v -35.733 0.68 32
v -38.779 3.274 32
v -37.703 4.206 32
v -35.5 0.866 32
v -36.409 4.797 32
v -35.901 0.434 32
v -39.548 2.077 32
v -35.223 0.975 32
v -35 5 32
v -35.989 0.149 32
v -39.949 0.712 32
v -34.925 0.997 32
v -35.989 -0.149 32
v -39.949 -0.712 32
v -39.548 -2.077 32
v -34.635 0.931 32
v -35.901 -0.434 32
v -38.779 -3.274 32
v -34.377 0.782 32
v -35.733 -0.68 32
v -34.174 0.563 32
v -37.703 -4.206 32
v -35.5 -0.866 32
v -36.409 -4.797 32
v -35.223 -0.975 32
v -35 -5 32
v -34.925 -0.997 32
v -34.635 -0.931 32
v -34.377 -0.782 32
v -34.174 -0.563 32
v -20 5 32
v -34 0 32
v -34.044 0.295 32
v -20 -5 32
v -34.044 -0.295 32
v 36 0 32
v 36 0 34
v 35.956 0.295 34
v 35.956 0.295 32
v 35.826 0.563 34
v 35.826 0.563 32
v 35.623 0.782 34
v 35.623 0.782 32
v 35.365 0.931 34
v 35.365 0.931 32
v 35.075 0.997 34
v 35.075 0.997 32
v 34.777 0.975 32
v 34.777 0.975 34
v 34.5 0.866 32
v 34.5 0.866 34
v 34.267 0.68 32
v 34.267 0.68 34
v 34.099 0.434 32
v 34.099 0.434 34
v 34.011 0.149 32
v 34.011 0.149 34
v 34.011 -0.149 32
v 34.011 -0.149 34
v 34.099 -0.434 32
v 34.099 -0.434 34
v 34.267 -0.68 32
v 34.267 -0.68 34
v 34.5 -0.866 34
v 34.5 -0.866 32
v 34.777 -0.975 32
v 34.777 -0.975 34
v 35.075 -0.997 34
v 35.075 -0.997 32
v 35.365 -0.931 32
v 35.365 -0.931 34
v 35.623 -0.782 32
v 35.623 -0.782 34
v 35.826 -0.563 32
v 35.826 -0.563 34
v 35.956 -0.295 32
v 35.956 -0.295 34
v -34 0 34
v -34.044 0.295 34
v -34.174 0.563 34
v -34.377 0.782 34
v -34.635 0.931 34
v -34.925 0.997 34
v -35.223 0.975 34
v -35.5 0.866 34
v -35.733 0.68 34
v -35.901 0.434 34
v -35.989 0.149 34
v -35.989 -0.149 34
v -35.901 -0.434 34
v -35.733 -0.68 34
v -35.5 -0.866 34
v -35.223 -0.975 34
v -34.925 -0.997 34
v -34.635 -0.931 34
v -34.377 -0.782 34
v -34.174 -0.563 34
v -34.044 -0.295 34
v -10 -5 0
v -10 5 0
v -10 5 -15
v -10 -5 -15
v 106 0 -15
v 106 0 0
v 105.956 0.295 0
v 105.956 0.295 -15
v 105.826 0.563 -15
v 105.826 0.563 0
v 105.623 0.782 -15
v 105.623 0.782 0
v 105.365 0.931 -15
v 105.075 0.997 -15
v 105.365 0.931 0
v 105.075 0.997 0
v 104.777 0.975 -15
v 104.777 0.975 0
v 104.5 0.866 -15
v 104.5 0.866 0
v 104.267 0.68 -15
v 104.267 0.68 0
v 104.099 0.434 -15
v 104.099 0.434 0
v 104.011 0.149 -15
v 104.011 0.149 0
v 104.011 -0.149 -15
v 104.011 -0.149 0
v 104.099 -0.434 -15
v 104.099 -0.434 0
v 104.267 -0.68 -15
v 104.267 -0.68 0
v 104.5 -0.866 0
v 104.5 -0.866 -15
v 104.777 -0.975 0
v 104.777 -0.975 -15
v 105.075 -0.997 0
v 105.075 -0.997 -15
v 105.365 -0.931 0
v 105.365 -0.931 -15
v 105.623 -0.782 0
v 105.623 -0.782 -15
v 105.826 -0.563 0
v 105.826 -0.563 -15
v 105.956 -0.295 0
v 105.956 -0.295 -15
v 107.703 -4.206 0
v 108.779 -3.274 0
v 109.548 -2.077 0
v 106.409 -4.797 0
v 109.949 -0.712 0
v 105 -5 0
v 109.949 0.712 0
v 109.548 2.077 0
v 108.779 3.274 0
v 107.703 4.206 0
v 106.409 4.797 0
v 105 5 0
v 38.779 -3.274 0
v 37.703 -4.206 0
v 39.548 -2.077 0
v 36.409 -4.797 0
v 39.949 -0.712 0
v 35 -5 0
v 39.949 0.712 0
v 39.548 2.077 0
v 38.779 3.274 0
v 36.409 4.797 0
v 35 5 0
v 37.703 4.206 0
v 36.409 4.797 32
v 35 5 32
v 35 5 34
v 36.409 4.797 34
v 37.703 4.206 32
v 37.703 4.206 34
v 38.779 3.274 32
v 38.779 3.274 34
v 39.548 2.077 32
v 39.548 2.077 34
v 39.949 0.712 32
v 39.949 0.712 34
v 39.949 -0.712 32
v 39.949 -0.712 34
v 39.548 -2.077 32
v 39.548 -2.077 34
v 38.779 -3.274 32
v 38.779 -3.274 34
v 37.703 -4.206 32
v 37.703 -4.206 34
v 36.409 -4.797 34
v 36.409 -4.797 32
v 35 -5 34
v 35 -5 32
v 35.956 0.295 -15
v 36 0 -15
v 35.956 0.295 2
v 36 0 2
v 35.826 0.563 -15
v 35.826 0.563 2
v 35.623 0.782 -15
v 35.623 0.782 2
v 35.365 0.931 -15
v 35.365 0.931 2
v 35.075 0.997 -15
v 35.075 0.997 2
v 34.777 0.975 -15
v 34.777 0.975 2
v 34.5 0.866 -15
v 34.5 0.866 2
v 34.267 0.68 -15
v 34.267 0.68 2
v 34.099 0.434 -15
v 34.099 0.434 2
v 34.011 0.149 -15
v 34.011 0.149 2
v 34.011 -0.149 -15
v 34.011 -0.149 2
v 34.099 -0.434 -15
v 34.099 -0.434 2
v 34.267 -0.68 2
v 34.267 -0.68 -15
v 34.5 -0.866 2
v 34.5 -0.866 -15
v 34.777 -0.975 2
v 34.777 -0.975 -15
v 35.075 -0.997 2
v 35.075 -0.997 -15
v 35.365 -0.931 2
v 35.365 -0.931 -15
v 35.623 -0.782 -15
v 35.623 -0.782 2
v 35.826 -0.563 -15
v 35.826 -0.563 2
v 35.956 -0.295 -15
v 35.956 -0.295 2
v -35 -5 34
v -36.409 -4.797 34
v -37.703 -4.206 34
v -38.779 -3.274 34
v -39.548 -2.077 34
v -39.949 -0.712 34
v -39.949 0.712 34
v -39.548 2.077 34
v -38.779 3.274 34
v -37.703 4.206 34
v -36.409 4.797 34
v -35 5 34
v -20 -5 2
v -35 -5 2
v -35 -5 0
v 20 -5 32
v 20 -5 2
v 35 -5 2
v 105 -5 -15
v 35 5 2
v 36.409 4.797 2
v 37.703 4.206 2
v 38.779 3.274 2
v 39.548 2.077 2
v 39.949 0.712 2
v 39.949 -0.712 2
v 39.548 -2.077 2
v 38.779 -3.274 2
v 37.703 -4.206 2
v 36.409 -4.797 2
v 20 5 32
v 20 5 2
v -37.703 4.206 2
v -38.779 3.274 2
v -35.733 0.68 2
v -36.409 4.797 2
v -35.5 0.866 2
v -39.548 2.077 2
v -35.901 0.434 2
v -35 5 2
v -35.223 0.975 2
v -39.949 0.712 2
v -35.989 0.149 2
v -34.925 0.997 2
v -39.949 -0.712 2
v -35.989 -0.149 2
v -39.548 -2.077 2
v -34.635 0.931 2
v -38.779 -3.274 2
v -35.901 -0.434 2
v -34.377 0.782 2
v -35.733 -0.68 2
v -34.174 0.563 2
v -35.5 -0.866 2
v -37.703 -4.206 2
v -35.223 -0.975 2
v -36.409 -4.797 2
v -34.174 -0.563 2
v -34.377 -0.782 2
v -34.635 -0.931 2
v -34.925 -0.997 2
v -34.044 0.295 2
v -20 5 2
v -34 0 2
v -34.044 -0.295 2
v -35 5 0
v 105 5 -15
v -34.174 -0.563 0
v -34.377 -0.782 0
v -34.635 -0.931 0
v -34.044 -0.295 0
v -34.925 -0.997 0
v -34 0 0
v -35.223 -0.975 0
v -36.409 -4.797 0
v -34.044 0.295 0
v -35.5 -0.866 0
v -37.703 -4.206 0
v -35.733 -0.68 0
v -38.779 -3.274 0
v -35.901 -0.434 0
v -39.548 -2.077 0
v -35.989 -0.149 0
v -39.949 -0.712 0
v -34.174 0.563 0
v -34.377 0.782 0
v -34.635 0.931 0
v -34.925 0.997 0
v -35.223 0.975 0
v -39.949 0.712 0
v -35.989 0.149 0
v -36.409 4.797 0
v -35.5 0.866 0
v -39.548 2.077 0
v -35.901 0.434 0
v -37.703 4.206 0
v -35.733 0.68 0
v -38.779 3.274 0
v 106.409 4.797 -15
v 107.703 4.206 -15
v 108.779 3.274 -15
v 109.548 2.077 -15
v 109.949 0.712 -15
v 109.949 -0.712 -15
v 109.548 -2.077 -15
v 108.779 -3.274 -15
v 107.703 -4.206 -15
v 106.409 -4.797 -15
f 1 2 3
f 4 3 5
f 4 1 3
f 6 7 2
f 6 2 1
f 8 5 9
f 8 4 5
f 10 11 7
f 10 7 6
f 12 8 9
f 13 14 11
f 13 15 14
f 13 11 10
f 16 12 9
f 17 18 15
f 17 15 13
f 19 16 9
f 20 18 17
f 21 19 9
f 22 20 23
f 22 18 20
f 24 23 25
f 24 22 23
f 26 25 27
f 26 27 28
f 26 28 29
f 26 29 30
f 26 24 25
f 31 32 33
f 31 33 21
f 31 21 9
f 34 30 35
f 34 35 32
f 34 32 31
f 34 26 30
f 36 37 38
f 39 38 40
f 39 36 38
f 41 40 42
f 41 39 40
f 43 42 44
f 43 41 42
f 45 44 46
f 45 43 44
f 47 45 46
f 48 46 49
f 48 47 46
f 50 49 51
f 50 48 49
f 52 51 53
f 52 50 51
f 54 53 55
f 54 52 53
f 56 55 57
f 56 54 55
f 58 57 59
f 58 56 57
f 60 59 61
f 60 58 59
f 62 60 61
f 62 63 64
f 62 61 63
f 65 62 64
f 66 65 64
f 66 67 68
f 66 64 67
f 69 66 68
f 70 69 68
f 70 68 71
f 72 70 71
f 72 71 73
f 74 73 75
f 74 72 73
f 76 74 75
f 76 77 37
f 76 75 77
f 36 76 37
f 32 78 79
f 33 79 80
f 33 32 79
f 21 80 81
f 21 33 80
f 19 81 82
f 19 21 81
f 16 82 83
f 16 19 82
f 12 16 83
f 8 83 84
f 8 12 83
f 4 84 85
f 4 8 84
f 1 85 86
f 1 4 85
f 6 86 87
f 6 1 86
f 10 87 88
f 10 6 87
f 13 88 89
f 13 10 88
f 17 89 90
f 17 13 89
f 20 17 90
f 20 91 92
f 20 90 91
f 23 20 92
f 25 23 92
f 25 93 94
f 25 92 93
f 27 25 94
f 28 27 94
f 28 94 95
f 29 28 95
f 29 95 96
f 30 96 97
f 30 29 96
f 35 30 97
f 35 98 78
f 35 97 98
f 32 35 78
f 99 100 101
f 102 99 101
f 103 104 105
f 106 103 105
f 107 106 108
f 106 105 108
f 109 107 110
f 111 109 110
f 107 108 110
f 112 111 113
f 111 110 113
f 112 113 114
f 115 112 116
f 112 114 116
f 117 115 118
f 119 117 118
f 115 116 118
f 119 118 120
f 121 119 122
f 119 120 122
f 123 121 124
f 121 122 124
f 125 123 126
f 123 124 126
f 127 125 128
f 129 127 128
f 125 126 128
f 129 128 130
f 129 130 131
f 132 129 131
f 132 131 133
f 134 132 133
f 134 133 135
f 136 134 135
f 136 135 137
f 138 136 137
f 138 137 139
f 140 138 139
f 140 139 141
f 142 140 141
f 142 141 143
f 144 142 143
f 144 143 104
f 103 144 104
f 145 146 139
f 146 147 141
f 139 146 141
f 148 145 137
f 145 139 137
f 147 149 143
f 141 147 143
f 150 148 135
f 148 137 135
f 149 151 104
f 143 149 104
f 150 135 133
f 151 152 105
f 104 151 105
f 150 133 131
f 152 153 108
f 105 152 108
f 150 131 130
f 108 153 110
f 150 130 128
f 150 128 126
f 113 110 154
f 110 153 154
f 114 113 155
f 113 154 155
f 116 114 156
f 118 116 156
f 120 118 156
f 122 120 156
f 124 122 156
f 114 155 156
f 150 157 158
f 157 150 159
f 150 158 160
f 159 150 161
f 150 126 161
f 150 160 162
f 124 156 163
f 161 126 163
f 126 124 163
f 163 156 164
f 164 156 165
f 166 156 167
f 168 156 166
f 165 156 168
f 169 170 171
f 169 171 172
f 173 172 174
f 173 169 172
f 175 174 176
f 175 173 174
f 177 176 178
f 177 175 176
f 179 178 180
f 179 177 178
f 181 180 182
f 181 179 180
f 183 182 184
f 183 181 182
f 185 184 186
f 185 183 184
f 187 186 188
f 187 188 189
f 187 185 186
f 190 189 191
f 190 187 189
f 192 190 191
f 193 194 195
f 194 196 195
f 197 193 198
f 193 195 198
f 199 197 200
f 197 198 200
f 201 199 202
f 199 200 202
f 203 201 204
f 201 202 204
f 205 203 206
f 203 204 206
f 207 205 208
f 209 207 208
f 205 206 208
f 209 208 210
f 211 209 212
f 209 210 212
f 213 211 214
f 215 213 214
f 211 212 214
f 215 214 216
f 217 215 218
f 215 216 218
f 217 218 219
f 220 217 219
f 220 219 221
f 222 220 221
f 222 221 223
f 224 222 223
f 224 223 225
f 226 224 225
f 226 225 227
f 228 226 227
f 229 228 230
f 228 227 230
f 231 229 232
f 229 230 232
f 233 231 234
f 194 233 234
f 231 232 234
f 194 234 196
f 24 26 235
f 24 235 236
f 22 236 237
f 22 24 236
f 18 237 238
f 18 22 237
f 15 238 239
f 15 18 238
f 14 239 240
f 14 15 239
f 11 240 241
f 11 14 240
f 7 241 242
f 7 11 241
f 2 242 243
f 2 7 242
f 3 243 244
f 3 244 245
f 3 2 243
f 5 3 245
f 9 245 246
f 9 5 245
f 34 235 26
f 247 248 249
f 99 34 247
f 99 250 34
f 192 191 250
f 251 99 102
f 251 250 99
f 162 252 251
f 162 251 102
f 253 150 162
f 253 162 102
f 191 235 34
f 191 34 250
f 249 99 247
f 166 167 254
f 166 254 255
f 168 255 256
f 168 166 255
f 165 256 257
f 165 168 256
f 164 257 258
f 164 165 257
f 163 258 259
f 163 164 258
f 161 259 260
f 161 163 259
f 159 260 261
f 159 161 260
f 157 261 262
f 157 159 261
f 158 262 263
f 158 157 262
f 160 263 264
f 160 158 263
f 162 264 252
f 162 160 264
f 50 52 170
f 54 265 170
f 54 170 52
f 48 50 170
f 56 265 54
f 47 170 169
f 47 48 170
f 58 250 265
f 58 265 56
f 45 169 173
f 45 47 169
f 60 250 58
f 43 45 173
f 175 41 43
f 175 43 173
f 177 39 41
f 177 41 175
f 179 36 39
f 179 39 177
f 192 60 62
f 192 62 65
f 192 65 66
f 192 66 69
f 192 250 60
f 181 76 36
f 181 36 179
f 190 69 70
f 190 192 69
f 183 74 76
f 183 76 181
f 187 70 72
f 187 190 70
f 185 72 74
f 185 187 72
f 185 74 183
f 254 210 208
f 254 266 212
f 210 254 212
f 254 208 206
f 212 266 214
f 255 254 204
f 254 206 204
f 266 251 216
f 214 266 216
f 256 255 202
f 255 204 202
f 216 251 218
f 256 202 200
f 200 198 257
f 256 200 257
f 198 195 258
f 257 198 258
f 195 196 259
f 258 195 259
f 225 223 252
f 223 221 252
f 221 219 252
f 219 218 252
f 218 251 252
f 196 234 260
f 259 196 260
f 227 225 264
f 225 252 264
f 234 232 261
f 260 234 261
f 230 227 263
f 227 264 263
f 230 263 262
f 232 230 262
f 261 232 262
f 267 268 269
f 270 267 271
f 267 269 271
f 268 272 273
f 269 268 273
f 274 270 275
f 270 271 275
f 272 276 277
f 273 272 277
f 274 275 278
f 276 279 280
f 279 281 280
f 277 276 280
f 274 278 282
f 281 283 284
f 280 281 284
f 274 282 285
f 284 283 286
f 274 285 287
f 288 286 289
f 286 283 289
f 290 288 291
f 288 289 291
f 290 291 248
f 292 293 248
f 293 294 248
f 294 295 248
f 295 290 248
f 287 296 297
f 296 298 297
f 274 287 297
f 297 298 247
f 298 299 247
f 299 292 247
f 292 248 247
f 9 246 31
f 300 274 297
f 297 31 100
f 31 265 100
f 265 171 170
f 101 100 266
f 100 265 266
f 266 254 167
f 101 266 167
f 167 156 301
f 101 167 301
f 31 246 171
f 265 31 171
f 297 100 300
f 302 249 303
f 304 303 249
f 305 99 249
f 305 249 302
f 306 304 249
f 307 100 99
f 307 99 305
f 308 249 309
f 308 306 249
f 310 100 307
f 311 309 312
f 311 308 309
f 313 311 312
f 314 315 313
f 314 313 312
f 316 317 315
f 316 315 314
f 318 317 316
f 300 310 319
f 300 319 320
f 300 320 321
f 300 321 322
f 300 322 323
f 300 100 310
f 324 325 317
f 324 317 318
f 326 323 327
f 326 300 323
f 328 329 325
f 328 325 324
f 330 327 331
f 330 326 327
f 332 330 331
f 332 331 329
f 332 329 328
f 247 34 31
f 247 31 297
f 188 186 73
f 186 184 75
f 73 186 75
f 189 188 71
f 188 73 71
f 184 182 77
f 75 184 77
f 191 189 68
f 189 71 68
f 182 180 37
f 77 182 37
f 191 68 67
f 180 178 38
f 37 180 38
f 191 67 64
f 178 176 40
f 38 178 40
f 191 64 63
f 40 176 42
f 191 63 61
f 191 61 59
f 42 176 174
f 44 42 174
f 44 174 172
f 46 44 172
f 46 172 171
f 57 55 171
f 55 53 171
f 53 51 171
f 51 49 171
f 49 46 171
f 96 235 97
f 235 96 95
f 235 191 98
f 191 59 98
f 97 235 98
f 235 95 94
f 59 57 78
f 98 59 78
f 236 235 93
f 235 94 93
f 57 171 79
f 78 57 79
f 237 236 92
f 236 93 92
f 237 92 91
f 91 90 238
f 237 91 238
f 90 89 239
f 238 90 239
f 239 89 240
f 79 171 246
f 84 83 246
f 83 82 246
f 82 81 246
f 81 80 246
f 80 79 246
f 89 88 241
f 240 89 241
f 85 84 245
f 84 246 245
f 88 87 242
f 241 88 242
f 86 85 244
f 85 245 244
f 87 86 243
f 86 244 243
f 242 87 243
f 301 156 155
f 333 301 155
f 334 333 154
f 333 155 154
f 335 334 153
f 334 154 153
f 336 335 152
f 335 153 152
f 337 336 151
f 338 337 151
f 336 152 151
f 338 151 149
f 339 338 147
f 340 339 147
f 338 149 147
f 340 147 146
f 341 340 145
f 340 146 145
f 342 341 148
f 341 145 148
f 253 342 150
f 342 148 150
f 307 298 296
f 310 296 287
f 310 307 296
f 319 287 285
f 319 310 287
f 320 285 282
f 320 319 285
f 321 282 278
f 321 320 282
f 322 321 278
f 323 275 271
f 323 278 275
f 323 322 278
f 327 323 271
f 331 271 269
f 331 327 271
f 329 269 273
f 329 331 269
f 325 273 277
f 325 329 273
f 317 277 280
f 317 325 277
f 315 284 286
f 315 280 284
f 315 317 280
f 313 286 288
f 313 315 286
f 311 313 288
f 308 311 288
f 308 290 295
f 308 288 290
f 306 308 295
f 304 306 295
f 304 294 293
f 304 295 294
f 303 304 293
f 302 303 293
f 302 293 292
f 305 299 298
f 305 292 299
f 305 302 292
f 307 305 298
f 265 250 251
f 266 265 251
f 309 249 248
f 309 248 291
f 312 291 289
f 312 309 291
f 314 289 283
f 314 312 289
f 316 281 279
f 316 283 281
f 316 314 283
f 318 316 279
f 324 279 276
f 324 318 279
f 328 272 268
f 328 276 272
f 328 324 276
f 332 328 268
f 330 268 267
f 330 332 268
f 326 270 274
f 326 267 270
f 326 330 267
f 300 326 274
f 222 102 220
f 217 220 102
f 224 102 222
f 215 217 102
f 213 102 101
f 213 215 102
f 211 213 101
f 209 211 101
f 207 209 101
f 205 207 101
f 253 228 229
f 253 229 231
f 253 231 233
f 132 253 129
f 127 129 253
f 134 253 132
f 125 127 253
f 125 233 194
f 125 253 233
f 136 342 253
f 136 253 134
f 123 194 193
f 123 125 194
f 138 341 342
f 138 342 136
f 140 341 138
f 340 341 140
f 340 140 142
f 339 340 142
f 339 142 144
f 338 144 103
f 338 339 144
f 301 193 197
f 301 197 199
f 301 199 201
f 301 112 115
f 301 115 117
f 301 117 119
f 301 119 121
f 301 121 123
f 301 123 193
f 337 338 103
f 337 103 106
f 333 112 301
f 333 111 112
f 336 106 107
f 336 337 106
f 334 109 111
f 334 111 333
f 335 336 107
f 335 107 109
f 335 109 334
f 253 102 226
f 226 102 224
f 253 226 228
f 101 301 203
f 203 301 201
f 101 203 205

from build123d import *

# Parameters (mm, degrees)
EXTRUDE_1_DEPTH          = 34
SKETCH_2_R               = 1
CUT_EXTRUDE_4_DEPTH      = 35
CUT_EXTRUDE_4_DEPTH_BACK = 30
SKETCH_3_W               = 20
SKETCH_3_H               = 30
CUT_EXTRUDE_5_DEPTH      = 30
CUT_EXTRUDE_5_DEPTH_BACK = 30
EXTRUDE_4_DEPTH          = 15
SKETCH_5_R               = 1
CUT_EXTRUDE_7_DEPTH      = 16
SKETCH_6_W               = 15
SKETCH_6_H               = 10
EXTRUDE_5_DEPTH          = 10


with BuildPart() as part:
    # 草圖1 → 填料-伸長1 (new body)
    with BuildSketch(Plane.XY):
        with BuildLine():
            Line((-35, 5), (35, 5))
            ThreePointArc((35, 5), (40, 0), (35, -5))
            Line((35, -5), (-35, -5))
            ThreePointArc((-35, -5), (-40, 0), (-35, 5))
        make_face()
    extrude(amount=EXTRUDE_1_DEPTH)

    # 草圖2 → 除料-伸長4 (cut, two sides)
    with BuildSketch(Plane.XY) as cut_extrude_4_sk:
        with Locations((-35, 0)):
            Circle(SKETCH_2_R)
        with Locations((35, 0)):
            Circle(SKETCH_2_R)
    extrude(amount=CUT_EXTRUDE_4_DEPTH, mode=Mode.SUBTRACT)
    extrude(cut_extrude_4_sk.sketch, amount=-CUT_EXTRUDE_4_DEPTH_BACK, mode=Mode.SUBTRACT)

    # 草圖3 → 除料-伸長5 (cut, two sides)
    with BuildSketch(Plane(origin=(0, 0, 0), x_dir=(1, 0, 0), z_dir=(0, 1, 0))) as cut_extrude_5_sk:
        with Locations((-30, -17)):
            Rectangle(SKETCH_3_W, SKETCH_3_H)
        with Locations((30, -17)):
            Rectangle(SKETCH_3_W, SKETCH_3_H)
    extrude(amount=CUT_EXTRUDE_5_DEPTH, mode=Mode.SUBTRACT)
    extrude(cut_extrude_5_sk.sketch, amount=-CUT_EXTRUDE_5_DEPTH_BACK, mode=Mode.SUBTRACT)

    # 草圖4 → 填料-伸長4 (add)
    with BuildSketch(Plane.XY):
        with BuildLine():
            Line((0, 5), (105, 5))
            ThreePointArc((105, 5), (110, 0), (105, -5))
            Line((105, -5), (0, -5))
            Line((0, -5), (0, 5))
        make_face()
    extrude(amount=-EXTRUDE_4_DEPTH)

    # 草圖5 → 除料-伸長7 (cut, through all)
    with BuildSketch(Plane.XY):
        with Locations((35, 0)):
            Circle(SKETCH_5_R)
        with Locations((105, 0)):
            Circle(SKETCH_5_R)
    extrude(amount=-CUT_EXTRUDE_7_DEPTH, mode=Mode.SUBTRACT)

    # 草圖6 → 填料-伸長5 (add)
    with BuildSketch(Plane(origin=(0, 0, 0), x_dir=(0, 0, -1), z_dir=(1, 0, 0))):
        with Locations((7.5, 0)):
            Rectangle(SKETCH_6_W, SKETCH_6_H)
    extrude(amount=-EXTRUDE_5_DEPTH)


solid = part.part
